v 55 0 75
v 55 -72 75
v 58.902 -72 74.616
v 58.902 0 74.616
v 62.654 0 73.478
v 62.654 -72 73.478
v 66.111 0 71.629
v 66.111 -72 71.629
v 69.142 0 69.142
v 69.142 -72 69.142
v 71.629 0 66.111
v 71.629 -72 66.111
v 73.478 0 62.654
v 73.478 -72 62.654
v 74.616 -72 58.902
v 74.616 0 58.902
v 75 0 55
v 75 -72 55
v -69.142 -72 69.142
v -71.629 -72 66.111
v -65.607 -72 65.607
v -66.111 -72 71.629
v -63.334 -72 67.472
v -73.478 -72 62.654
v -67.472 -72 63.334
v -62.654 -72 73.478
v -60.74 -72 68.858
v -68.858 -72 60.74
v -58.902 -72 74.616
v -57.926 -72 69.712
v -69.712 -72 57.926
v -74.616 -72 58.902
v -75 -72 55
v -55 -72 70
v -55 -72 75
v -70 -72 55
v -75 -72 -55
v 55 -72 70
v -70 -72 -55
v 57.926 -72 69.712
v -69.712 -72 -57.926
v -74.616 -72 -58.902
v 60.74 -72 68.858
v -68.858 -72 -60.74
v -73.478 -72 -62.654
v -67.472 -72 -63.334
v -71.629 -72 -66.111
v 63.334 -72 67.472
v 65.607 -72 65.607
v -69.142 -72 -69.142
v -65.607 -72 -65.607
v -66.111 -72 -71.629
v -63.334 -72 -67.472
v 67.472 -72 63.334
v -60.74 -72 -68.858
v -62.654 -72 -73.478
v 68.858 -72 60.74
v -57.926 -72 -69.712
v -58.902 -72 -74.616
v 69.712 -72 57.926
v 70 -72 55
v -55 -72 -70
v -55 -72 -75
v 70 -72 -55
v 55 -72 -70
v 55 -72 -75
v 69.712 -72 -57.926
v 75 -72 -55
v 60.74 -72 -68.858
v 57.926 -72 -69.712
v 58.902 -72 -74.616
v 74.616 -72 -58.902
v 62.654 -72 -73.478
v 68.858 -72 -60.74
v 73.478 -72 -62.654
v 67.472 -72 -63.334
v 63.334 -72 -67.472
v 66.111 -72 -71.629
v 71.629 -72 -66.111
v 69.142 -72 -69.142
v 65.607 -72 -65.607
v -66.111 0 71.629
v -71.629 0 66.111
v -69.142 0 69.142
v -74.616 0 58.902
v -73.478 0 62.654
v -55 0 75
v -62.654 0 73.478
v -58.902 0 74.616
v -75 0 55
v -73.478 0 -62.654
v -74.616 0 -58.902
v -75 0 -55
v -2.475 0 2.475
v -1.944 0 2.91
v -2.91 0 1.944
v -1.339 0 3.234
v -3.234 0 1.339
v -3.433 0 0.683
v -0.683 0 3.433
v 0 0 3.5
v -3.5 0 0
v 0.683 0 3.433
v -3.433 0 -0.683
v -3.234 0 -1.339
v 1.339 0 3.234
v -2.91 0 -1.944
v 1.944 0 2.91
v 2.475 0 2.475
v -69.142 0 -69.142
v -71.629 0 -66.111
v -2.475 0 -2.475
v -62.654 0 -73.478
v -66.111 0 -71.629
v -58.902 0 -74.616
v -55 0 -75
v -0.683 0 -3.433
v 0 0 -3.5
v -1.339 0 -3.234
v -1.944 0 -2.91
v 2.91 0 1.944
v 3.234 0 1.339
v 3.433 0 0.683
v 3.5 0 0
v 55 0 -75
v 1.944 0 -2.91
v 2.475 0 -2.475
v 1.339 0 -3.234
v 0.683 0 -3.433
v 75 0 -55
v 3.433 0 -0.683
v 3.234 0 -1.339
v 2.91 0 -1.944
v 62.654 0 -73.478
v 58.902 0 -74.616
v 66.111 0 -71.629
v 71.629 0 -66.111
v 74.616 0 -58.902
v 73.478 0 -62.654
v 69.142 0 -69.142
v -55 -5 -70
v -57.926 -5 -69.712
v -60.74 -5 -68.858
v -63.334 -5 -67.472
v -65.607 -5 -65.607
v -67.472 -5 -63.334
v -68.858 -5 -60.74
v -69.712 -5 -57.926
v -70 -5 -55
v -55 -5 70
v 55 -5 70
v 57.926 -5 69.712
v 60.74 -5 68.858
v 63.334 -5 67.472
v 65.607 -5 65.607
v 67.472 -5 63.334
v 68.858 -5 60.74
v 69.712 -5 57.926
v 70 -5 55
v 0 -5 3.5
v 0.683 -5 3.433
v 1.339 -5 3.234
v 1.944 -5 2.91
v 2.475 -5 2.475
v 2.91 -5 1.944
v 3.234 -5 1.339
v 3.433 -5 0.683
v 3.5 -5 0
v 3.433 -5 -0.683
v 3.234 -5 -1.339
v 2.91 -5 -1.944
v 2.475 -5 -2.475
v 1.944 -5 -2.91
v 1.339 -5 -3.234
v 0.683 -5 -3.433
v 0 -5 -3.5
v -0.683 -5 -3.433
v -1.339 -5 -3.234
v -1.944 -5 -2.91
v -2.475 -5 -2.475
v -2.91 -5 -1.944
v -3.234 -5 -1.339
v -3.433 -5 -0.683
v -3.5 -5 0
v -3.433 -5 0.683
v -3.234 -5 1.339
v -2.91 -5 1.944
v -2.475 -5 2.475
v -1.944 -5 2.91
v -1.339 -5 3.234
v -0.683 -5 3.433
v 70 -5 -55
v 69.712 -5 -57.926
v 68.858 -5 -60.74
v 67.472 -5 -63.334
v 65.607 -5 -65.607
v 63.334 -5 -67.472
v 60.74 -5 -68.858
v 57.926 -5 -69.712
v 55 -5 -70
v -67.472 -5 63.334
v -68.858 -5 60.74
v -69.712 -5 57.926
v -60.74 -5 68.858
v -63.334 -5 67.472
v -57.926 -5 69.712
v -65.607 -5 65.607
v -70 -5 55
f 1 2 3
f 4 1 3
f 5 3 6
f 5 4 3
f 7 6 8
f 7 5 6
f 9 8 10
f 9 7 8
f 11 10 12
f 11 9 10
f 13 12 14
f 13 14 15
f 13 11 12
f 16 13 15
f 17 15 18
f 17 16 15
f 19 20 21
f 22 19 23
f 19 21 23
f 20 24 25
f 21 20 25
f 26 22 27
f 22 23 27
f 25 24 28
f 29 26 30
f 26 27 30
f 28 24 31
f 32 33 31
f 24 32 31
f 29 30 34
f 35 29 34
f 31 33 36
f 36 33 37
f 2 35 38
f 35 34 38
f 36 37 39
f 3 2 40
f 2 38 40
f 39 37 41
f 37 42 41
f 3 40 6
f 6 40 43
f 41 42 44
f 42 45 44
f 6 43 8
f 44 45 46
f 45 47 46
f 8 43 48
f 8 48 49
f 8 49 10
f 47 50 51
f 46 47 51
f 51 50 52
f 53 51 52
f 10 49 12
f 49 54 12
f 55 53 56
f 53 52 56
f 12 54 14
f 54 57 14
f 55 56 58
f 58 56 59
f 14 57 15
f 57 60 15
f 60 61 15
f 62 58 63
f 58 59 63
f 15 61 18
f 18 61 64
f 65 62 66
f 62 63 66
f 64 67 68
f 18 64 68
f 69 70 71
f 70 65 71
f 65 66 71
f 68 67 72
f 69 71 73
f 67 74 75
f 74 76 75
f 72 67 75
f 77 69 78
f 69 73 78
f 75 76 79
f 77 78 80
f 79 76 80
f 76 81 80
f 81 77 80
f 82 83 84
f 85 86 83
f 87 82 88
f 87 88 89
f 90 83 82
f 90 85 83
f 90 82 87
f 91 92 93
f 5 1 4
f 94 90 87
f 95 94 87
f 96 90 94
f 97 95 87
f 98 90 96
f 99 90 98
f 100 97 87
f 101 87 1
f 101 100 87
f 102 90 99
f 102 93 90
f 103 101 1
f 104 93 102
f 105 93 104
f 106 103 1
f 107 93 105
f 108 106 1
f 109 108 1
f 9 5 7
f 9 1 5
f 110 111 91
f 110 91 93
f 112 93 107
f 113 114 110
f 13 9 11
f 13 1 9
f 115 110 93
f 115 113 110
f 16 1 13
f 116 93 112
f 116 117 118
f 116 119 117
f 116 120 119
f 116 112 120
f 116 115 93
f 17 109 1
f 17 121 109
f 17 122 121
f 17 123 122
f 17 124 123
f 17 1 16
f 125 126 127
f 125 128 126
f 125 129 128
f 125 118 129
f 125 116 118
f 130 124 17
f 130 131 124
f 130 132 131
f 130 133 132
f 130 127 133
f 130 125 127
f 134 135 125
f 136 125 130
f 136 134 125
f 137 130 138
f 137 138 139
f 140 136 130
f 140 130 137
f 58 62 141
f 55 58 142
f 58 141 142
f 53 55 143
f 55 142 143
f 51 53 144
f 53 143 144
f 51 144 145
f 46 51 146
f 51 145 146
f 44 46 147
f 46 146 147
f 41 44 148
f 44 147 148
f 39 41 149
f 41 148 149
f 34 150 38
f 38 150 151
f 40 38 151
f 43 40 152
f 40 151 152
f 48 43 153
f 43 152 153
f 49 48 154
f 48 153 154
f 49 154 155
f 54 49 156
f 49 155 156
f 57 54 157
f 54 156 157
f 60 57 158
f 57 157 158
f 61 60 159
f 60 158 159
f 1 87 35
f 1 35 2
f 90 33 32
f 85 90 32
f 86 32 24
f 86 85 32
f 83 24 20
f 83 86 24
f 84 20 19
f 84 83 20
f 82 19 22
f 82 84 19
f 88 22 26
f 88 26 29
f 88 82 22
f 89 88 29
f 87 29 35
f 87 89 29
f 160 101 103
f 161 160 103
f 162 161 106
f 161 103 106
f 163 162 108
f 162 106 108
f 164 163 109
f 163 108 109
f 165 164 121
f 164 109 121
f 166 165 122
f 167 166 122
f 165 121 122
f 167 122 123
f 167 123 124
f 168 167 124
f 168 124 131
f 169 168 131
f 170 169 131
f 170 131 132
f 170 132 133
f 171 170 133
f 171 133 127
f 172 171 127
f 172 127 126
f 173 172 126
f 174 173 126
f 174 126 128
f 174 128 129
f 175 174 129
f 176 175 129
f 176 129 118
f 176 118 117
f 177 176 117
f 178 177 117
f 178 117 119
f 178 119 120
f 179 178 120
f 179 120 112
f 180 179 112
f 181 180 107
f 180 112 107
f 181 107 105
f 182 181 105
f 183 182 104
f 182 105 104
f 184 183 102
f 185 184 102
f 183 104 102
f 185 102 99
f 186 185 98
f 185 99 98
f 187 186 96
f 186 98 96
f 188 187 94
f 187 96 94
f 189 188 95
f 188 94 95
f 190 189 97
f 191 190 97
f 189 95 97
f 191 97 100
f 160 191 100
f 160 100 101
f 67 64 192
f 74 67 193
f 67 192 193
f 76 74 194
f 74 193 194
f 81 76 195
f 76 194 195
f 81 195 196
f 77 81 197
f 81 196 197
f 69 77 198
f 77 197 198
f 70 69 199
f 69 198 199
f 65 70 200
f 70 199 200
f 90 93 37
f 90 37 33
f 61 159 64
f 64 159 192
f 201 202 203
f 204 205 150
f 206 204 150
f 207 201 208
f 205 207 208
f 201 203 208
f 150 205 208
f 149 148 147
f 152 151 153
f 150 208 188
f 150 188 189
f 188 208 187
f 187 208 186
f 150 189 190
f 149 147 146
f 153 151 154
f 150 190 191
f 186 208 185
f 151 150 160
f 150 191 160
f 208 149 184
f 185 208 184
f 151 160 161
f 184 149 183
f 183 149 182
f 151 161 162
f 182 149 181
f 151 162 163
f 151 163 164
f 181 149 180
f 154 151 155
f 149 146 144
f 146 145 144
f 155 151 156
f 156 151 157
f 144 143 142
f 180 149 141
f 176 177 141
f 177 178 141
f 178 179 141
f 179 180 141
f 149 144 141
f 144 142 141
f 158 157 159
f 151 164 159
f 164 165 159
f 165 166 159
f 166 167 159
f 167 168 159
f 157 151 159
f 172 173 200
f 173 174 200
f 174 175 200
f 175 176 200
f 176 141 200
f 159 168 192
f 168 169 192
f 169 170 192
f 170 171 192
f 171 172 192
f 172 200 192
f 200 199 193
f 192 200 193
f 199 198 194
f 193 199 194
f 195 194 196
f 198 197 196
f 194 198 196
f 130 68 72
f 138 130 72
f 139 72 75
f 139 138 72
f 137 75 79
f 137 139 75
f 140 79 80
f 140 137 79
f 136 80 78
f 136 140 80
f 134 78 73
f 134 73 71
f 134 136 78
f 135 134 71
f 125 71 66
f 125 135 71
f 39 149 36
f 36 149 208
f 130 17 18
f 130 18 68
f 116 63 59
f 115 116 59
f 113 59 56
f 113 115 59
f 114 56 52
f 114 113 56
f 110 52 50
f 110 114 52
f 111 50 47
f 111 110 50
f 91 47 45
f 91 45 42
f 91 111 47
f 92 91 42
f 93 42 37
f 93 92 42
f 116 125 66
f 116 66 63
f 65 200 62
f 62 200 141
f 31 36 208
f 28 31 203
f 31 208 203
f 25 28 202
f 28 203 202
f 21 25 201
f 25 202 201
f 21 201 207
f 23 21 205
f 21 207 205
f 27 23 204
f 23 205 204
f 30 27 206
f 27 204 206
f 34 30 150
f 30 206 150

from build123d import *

# Parameters (mm, degrees)
BASE_WALLS_DEPTH     = 72
BOX_SHELL_T          = -5
SHAFT_HOLE_PROFILE_R = 3.5
CUT_EXTRUDE1_DEPTH   = 129.195163715


with BuildPart() as part:
    # Base Top Face Profile → Base Walls (new body)
    with BuildSketch(Plane(origin=(0, 0, 0), x_dir=(1, 0, 0), z_dir=(0, 1, 0))):
        with BuildLine():
            Line((-55, -75), (55, -75))
            ThreePointArc((55, -75), (69.142135624, -69.142135624), (75, -55))
            Line((75, -55), (75, 55))
            ThreePointArc((75, 55), (69.142135624, 69.142135624), (55, 75))
            Line((55, 75), (-55, 75))
            ThreePointArc((-55, 75), (-69.142135624, 69.142135624), (-75, 55))
            Line((-75, 55), (-75, -55))
            ThreePointArc((-75, -55), (-69.142135624, -69.142135624), (-55, -75))
        make_face()
    extrude(amount=-BASE_WALLS_DEPTH)

    # Box Shell
    box_shell_openings = [part.faces().sort_by_distance(p)[0] for p in [
        (0, -72, 0),
    ]]
    offset(amount=BOX_SHELL_T, openings=box_shell_openings, kind=Kind.INTERSECTION)

    # Shaft Hole Profile → Cut-Extrude1 (cut, through all)
    with BuildSketch(Plane(origin=(0, 0, 0), x_dir=(1, 0, 0), z_dir=(0, 1, 0))):
        with Locations(Location((0, 0, 0), (0, 0, 270))):
            Circle(SHAFT_HOLE_PROFILE_R)
    extrude(amount=-CUT_EXTRUDE1_DEPTH, mode=Mode.SUBTRACT)


solid = part.part
